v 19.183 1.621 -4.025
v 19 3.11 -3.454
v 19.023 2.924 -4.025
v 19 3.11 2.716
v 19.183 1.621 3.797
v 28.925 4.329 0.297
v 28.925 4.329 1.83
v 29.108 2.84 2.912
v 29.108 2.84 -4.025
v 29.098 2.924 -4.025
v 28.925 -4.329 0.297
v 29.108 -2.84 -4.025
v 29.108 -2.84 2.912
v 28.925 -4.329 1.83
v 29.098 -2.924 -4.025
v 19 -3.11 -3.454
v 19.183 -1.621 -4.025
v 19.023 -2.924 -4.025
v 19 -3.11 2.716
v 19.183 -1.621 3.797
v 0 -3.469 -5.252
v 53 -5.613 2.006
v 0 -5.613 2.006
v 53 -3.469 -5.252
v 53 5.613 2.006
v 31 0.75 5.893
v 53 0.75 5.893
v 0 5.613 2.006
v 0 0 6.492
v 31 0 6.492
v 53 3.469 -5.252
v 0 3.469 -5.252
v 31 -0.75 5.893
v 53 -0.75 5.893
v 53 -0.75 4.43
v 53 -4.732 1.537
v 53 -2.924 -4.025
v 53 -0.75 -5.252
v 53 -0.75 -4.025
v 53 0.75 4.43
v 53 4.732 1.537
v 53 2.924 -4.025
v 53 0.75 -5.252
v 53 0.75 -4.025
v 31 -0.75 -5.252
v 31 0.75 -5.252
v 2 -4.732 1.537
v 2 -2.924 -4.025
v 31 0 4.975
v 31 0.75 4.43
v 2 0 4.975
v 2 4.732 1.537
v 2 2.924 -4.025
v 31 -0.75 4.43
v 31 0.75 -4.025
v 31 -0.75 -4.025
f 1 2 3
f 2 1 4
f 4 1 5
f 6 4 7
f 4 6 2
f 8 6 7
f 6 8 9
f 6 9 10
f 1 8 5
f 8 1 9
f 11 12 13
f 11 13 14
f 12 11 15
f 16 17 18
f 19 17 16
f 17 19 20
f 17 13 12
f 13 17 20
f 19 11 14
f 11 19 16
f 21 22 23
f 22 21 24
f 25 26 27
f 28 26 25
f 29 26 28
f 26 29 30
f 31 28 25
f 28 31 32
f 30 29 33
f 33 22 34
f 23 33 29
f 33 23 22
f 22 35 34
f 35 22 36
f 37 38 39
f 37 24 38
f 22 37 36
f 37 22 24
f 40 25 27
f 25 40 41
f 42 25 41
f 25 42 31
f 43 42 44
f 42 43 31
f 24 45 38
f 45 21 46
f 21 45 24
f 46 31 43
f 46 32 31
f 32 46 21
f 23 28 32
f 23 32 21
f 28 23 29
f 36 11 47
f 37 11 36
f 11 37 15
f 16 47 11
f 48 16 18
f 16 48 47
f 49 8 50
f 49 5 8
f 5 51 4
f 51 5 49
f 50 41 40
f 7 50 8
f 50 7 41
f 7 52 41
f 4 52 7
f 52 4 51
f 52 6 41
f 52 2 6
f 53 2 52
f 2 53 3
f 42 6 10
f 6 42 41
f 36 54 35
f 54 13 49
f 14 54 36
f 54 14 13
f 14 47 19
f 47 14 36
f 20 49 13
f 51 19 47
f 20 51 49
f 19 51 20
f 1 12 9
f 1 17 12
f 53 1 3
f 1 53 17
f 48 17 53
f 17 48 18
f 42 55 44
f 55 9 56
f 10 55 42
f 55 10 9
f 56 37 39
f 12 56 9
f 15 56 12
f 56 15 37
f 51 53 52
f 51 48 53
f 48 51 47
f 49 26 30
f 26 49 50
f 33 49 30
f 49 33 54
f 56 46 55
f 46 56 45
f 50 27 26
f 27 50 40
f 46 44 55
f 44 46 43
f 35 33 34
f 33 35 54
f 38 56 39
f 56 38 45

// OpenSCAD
innerWidth = 8.05;
bladeLength = 27;
handleAreaLength = 22;
tolerance = 0;
aspectRatio = 1.1;
wallThickness = 0.75;
tipThickness = 2;
slitThickness = 1.5;
strutThickness = 1.5;
strutWidth = 10;

module cyl(w=8,h=8) {
    rotate(360/5/2)
    cylinder($fn=5,d=w/cos(180/5),h=h);
}

nudge = 0.001;
outerWidth = innerWidth + tolerance*2 + 2*wallThickness;
insideLength = tipThickness+bladeLength+handleAreaLength;

render(convexity=2)
rotate([0,90,0]) 
{
intersection() {
    cyl(w=outerWidth,h=insideLength+tipThickness);
    for (s=[-1,1]) 
        mirror([0,s<0?1:0,0])
        translate([-outerWidth/2-10,-strutThickness/2-strutThickness/2-innerWidth/5,tipThickness+bladeLength-strutWidth])
    rotate([7,0,0])
    cube([outerWidth+20,strutThickness,strutWidth]);
}

difference() {
    scale([aspectRatio,1,1])
    cyl(w=outerWidth,h=insideLength+tipThickness);
    translate([0,0,tipThickness])
    cyl(w=innerWidth+tolerance*2,h=insideLength+nudge);
    translate([-outerWidth/2-10, -slitThickness/2, insideLength+tipThickness-handleAreaLength]) cube([outerWidth+20,slitThickness,handleAreaLength+nudge]);
}
}
